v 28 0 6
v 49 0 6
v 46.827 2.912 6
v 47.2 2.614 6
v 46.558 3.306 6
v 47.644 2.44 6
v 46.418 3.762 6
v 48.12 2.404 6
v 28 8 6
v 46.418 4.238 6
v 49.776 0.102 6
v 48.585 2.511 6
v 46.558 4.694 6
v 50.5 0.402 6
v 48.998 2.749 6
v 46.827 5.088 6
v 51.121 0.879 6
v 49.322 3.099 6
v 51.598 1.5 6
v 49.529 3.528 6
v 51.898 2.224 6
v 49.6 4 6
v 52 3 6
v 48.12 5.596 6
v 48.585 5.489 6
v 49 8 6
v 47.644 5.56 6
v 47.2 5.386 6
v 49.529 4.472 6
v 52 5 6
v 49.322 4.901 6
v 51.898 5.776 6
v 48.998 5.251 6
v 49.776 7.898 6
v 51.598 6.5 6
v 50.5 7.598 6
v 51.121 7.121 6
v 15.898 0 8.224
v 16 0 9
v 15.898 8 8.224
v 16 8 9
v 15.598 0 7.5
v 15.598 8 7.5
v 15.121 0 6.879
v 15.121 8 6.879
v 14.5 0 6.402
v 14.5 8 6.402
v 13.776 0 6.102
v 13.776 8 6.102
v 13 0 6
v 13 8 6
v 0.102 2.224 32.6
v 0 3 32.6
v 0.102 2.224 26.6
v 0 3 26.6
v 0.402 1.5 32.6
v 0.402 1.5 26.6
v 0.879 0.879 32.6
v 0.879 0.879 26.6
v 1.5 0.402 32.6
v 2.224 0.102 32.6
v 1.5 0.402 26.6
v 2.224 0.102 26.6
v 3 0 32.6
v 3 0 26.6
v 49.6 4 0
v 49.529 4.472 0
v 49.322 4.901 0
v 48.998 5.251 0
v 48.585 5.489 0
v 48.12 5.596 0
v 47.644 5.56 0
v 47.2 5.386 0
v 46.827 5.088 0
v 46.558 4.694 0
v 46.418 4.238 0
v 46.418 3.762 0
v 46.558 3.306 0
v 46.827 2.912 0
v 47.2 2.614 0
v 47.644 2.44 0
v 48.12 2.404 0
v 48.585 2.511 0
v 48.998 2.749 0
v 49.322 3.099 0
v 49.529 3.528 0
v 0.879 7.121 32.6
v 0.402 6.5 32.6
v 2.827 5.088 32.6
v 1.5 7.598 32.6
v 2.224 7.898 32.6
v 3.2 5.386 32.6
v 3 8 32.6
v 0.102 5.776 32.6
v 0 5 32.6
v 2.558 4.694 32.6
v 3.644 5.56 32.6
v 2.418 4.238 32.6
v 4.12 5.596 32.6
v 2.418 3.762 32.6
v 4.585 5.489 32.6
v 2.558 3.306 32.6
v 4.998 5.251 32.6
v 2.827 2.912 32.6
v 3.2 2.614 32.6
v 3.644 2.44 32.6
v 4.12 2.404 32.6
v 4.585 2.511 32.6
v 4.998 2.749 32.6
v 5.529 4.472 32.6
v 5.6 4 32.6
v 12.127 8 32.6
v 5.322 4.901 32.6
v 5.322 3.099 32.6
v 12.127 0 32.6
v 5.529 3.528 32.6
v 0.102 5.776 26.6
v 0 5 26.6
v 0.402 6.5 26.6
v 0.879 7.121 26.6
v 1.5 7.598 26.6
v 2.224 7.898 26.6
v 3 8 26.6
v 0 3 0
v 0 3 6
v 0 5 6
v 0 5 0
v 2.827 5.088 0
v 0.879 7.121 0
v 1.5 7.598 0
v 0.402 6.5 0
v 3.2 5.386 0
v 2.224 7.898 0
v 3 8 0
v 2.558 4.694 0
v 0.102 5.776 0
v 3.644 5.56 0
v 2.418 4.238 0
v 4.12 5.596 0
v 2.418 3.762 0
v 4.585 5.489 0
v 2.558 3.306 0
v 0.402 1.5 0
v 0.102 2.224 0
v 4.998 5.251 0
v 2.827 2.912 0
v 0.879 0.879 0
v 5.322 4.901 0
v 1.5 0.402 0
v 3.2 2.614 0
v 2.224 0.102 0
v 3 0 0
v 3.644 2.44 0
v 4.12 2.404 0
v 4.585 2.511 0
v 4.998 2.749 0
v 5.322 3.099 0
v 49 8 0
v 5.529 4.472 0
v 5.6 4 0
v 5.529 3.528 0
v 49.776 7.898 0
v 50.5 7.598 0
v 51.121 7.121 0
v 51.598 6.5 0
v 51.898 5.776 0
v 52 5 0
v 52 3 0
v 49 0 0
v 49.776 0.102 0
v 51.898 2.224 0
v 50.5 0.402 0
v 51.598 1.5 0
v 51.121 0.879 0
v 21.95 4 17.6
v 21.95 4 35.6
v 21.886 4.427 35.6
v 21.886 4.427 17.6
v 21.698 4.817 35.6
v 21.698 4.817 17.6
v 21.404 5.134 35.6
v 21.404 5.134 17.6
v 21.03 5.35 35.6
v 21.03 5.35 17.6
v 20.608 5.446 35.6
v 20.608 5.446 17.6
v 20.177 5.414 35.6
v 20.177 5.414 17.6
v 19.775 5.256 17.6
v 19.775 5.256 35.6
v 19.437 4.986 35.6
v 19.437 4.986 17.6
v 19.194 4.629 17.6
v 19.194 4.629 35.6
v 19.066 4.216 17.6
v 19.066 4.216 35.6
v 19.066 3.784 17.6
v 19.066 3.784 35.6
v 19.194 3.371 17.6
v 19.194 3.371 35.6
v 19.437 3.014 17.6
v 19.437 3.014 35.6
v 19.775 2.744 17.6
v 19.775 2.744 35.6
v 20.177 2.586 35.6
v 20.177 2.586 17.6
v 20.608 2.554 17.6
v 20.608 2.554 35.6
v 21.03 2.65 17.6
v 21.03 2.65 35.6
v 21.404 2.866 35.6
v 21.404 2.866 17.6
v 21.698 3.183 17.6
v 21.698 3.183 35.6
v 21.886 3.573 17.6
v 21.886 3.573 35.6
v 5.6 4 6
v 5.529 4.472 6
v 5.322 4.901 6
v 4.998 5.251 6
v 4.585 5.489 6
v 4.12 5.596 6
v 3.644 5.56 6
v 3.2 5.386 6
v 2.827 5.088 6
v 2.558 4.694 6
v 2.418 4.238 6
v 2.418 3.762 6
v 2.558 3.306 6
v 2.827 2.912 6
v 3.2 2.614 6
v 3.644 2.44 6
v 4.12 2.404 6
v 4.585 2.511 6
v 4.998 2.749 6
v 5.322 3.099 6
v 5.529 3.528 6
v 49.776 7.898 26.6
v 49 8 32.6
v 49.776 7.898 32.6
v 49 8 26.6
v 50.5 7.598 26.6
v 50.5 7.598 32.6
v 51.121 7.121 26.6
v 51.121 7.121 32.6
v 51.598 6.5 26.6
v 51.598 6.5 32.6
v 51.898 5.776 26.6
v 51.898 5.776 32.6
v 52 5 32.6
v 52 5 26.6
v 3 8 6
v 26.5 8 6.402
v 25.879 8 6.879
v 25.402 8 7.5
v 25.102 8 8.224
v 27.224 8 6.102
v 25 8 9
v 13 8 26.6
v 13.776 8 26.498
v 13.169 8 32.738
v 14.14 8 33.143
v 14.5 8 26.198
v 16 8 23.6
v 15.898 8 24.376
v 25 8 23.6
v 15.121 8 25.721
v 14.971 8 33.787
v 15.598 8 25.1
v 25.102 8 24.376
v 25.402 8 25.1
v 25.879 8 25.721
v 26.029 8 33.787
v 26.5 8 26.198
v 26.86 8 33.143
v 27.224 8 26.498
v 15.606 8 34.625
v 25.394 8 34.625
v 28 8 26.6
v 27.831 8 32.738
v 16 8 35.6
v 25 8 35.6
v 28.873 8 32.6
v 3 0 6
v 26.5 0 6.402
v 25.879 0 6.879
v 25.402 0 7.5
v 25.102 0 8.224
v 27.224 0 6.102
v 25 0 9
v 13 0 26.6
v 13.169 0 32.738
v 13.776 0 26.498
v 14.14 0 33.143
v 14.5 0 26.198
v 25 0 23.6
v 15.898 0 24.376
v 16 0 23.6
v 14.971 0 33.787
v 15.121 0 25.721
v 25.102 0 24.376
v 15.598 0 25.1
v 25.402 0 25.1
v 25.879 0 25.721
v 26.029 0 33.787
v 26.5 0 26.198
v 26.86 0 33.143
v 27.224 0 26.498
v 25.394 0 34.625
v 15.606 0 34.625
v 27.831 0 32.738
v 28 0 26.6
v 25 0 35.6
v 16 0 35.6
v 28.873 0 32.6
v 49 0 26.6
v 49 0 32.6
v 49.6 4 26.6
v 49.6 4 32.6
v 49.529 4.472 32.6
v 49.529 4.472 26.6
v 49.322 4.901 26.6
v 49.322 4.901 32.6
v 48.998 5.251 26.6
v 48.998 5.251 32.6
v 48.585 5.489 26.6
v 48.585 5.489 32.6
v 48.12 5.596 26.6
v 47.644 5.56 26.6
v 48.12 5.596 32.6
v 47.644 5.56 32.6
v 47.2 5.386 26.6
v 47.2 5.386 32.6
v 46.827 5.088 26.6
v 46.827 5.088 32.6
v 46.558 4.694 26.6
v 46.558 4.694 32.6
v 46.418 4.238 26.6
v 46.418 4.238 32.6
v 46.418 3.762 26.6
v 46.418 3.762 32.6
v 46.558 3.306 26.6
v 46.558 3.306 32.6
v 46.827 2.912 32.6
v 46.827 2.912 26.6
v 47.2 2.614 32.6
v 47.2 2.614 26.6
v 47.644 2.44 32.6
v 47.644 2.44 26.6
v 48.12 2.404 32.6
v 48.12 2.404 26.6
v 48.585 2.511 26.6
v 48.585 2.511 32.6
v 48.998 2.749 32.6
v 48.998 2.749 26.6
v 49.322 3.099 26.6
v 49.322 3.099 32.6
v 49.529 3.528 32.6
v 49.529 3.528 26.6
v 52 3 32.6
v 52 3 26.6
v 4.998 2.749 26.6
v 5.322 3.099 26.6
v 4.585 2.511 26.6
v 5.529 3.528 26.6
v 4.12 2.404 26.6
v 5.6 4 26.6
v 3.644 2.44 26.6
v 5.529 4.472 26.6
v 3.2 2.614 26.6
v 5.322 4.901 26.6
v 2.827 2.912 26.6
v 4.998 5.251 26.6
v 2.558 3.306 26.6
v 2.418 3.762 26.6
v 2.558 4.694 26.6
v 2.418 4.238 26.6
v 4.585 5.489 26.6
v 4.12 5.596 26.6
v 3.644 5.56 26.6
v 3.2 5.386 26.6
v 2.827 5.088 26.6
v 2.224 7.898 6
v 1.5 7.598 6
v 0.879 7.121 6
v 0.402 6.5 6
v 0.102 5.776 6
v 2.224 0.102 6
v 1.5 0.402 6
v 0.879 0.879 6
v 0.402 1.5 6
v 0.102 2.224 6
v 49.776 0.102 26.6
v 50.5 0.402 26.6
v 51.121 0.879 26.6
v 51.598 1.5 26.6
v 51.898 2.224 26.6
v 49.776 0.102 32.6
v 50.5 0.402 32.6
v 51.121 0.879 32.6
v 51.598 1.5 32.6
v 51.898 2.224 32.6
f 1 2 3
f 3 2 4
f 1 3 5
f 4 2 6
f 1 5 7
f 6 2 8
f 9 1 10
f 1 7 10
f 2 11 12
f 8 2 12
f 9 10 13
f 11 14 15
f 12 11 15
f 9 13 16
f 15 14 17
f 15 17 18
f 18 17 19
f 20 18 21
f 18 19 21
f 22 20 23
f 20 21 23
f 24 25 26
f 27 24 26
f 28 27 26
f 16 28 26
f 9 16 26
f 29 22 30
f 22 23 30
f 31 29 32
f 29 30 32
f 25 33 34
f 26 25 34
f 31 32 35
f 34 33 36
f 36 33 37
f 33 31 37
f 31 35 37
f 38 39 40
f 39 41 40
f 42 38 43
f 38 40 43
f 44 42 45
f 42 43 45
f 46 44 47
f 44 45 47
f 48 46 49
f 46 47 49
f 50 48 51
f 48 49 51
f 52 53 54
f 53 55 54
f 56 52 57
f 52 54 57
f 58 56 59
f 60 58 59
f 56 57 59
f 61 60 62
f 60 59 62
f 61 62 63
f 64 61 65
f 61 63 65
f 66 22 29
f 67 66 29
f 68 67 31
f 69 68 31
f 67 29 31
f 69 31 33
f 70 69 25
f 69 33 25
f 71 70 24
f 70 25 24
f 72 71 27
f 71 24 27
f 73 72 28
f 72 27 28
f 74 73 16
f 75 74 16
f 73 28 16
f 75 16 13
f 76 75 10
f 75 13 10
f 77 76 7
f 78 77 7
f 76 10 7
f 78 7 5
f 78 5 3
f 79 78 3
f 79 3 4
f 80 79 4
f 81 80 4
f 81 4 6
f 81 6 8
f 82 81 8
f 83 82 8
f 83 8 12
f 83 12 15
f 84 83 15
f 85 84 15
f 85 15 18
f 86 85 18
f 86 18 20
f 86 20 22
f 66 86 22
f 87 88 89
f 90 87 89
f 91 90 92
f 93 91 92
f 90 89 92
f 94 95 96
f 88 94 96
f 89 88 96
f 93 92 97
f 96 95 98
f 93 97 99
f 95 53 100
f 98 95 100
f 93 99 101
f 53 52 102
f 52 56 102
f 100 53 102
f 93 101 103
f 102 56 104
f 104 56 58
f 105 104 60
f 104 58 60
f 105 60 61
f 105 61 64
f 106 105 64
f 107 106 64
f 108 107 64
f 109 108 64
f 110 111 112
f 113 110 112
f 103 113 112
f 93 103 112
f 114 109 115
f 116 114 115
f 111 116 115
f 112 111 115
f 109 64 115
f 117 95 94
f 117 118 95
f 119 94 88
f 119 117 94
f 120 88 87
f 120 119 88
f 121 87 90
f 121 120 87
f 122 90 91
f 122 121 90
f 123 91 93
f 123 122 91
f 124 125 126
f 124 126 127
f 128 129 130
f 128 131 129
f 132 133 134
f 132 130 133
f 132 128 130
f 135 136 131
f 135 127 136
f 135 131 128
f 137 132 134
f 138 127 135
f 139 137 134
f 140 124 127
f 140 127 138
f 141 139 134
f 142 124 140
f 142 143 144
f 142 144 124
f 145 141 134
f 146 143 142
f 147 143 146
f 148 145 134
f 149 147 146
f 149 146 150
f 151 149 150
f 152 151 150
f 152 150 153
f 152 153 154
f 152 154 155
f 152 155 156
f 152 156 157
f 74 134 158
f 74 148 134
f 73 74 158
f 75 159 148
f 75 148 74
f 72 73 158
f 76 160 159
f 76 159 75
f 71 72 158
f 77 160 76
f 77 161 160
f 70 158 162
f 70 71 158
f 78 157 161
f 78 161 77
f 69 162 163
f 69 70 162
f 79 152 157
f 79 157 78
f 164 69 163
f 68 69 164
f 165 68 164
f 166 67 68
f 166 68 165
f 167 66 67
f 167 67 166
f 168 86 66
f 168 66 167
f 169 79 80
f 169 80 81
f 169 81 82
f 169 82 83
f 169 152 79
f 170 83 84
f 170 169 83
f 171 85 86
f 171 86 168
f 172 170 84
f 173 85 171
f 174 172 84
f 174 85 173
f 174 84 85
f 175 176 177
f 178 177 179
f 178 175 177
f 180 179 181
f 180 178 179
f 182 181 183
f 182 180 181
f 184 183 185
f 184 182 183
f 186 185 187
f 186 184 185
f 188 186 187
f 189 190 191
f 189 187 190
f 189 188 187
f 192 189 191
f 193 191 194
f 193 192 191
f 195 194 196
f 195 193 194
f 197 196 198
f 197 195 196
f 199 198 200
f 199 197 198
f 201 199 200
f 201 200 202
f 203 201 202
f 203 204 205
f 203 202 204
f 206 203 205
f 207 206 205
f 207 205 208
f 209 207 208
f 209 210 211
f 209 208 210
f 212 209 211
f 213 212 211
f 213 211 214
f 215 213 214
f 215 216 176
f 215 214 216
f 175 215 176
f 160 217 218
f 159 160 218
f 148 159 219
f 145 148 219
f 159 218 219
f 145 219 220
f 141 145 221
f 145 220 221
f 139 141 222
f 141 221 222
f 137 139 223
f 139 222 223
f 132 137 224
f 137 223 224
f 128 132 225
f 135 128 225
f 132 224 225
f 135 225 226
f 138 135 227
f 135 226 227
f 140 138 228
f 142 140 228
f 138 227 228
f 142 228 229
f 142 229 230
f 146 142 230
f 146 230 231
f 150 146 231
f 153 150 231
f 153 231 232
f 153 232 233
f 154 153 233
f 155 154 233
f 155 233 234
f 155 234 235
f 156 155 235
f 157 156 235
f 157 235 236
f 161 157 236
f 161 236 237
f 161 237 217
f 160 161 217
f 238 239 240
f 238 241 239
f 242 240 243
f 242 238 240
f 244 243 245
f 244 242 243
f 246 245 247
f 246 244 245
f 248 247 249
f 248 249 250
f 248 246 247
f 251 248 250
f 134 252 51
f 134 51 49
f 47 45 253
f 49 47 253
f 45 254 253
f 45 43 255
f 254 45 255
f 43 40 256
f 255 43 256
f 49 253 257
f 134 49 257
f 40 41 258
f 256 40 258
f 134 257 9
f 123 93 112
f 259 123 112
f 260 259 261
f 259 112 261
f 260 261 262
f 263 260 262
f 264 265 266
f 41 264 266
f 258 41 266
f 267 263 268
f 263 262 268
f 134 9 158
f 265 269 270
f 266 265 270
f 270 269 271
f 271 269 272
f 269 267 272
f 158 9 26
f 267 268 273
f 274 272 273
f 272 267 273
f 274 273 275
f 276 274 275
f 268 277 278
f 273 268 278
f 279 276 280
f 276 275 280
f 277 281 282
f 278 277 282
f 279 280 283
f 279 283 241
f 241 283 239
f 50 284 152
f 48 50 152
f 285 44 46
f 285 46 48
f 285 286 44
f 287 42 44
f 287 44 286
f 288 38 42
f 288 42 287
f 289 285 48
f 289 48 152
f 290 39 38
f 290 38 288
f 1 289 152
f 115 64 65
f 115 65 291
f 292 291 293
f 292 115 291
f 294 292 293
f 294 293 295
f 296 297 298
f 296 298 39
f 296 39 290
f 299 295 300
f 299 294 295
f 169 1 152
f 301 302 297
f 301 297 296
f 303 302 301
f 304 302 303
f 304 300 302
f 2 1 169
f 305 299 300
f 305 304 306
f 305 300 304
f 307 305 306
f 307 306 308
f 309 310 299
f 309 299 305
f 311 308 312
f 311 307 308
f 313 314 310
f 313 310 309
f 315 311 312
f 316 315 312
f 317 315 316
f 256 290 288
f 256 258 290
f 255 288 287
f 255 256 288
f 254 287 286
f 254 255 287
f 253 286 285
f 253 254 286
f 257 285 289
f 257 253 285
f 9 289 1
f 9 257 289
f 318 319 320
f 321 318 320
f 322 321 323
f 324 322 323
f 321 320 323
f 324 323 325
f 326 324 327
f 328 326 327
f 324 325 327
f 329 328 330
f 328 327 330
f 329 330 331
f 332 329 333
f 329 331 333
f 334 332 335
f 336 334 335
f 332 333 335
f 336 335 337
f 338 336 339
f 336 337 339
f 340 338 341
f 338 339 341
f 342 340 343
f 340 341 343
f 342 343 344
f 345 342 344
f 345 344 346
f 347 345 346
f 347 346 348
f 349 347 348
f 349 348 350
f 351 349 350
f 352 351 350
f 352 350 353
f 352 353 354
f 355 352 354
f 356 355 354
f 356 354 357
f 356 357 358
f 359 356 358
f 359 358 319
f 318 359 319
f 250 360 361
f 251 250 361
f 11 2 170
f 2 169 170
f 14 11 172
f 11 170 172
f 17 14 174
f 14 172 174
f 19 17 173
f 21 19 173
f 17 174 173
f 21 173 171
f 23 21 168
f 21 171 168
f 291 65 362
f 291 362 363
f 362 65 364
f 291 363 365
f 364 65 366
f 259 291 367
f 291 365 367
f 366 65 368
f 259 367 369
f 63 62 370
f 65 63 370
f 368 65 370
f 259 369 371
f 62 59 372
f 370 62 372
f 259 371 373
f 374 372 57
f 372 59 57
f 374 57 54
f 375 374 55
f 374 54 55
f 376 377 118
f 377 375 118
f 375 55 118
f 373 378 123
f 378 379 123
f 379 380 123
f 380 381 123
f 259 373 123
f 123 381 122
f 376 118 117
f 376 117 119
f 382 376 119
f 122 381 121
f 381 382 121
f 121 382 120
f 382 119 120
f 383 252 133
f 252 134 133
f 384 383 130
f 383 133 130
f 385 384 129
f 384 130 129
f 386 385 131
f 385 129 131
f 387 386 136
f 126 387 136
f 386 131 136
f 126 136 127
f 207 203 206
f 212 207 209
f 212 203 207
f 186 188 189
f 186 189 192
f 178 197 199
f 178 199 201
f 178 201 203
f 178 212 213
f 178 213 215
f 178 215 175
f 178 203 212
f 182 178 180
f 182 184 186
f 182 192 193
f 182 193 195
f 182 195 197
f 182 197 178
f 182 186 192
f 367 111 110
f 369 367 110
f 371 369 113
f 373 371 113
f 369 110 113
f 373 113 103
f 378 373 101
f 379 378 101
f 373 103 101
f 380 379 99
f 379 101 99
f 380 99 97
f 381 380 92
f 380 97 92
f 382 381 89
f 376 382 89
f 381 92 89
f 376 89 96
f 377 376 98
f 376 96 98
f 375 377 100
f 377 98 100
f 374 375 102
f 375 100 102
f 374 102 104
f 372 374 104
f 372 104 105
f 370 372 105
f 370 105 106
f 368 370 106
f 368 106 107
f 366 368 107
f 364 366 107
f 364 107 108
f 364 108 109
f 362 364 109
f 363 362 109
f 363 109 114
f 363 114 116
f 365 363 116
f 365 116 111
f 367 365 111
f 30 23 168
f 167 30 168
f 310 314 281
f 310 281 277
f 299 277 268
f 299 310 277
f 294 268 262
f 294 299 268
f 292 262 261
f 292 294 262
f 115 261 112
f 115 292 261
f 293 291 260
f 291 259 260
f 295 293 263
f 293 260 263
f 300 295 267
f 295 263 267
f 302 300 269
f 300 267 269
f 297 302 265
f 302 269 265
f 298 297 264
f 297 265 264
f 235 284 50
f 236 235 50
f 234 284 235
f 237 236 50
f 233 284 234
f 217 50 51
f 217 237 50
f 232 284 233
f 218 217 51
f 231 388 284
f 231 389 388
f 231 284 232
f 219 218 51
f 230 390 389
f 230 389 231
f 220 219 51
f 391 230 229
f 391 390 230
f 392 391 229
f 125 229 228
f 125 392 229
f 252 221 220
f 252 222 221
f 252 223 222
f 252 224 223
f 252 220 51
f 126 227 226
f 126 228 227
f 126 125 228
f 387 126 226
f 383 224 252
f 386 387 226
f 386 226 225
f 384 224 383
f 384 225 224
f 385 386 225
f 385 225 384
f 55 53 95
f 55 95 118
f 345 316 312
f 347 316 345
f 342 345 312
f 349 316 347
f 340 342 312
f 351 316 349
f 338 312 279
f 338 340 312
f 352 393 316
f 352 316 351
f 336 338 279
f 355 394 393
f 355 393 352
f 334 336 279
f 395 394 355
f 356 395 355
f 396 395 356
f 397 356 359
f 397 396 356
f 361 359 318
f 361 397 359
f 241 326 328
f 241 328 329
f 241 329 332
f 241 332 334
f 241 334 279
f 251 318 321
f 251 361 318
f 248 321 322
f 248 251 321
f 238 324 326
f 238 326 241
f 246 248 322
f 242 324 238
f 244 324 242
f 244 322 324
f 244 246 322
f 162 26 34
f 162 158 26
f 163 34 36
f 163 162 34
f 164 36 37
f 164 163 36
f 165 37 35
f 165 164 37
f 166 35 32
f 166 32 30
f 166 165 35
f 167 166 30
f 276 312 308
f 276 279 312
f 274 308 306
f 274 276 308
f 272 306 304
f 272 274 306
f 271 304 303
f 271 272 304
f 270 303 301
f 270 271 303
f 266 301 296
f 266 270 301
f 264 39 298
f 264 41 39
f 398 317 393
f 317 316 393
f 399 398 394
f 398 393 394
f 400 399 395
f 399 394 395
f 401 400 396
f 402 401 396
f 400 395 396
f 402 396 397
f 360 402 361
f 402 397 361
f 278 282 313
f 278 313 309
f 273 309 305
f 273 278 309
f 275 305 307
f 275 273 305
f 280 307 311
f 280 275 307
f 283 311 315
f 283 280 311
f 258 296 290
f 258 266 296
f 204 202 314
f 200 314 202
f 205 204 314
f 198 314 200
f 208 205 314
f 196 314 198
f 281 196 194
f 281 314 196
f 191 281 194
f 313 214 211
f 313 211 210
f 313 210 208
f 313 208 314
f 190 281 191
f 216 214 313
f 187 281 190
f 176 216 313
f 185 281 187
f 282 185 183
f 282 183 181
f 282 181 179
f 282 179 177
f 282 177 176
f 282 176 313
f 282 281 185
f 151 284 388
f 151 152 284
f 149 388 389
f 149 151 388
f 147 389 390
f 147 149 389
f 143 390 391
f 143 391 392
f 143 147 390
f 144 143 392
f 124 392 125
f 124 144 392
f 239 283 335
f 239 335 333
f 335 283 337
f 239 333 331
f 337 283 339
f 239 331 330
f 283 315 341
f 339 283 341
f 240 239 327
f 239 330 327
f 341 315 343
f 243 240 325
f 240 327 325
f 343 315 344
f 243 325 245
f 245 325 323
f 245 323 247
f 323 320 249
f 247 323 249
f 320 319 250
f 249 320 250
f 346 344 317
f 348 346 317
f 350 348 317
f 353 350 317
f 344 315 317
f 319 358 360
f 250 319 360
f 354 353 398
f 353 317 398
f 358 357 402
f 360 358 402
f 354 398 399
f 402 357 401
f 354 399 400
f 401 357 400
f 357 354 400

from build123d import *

# Parameters (mm, degrees)
SKETCH1_W               = 52
SKETCH1_H               = 32.6
BOSS_EXTRUDE1_DEPTH     = 8
SKETCH2_W               = 20.6
SKETCH2_H               = 8
CUT_EXTRUDE1_DEPTH      = 27
SKETCH3_W               = 20.6
SKETCH3_H               = 8
CUT_EXTRUDE2_DEPTH      = 16
SKETCH5_R               = 1.6
CUT_EXTRUDE4_DEPTH      = 62.893133706
FILLET1_R               = 3
FILLET2_R               = 3
SKETCH8_W               = 9
SKETCH8_H               = 8
BOSS_EXTRUDE2_DEPTH     = 3
CUT_EXTRUDE5_DEPTH      = 4
CUT_EXTRUDE5_DEPTH_BACK = 15
SKETCH6_R               = 1.45
FILLET3_R               = 4


with BuildPart() as part:
    # Sketch1 → Boss-Extrude1 (new body)
    with BuildSketch(Plane(origin=(0, 0, 0), x_dir=(1, 0, 0), z_dir=(0, 1, 0))):
        with Locations((26, -16.3)):
            Rectangle(SKETCH1_W, SKETCH1_H)
    extrude(amount=BOSS_EXTRUDE1_DEPTH)

    # Sketch2 → Cut-Extrude1 (cut)
    with BuildSketch(Plane(origin=(52, 0, 0), x_dir=(0, 0, -1), z_dir=(1, 0, 0))):
        with Locations((-16.3, 4)):
            Rectangle(SKETCH2_W, SKETCH2_H)
    extrude(amount=-CUT_EXTRUDE1_DEPTH, mode=Mode.SUBTRACT)

    # Sketch3 → Cut-Extrude2 (cut)
    with BuildSketch(Plane.ZY):
        with Locations((16.3, 4)):
            Rectangle(SKETCH3_W, SKETCH3_H)
    extrude(amount=-CUT_EXTRUDE2_DEPTH, mode=Mode.SUBTRACT)

    # Sketch5 → Cut-Extrude4 (cut, through all)
    with BuildSketch(Plane.XY.offset(32.6)):
        with Locations((4, 4)):
            Circle(SKETCH5_R)
        with Locations((48, 4)):
            Circle(SKETCH5_R)
    extrude(amount=-CUT_EXTRUDE4_DEPTH, mode=Mode.SUBTRACT)

    # Fillet1
    fillet1_edges = [part.edges().sort_by_distance(p)[0] for p in [
        (52, 8, 29.6),
        (52, 0, 3),
        (52, 8, 3),
        (0, 0, 29.6),
        (0, 8, 29.6),
        (0, 8, 3),
        (52, 0, 29.6),
        (0, 0, 3),
    ]]
    fillet(fillet1_edges, radius=FILLET1_R)

    # Fillet2
    fillet2_edges = [part.edges().sort_by_distance(p)[0] for p in [
        (25, 4, 26.6),
        (25, 4, 6),
        (16, 4, 6),
        (16, 4, 26.6),
    ]]
    fillet(fillet2_edges, radius=FILLET2_R)

    # Sketch8 → Boss-Extrude2 (add)
    with BuildSketch(Plane.XY.offset(32.6)):
        with Locations((20.5, 4)):
            Rectangle(SKETCH8_W, SKETCH8_H)
    extrude(amount=BOSS_EXTRUDE2_DEPTH)

    # Sketch6 → Cut-Extrude5 (cut, two sides: drawn at the far end of the back side and taken through both)
    with BuildSketch(Plane.XY.offset(32.6).offset(-CUT_EXTRUDE5_DEPTH_BACK)):
        with Locations((20.5, 4)):
            Circle(SKETCH6_R)
    extrude(amount=CUT_EXTRUDE5_DEPTH + CUT_EXTRUDE5_DEPTH_BACK, mode=Mode.SUBTRACT)

    # Fillet3
    # the kernel refuses this fillet: 4 mm, written as the material it adds along each edge
    with BuildSketch(Plane(origin=(25, 8, 32.6), x_dir=(0, 0, 1), z_dir=(0, -1, 0))) as fillet3_piece_1:
        with BuildLine():
            CenterArc((4, -3.872983346), FILLET3_R, 104.477512186, 75.522487814)
            Line((0, -3.872983346), (-0.08, -3.872983346))
            Line((-0.08, -3.872983346), (-0.08, 0))
            Line((-0.08, 0), (0, 0.08))
            ThreePointArc((0, 0.08), (1.5, 0.08), (2.98, 0.077459667))
            Line((2.98, 0.077459667), (3, 0))
        make_face()
    extrude(amount=8)
    with BuildSketch(Plane(origin=(16, 0, 32.6), x_dir=(-1, 0, 0), z_dir=(0, 1, 0))) as fillet3_piece_2:
        with BuildLine():
            CenterArc((3.872983346, 4), FILLET3_R, 194.477512186, 75.522487814)
            Line((0, 3), (-0.077459667, 2.98))
            ThreePointArc((-0.077459667, 2.98), (-0.08, 1.5), (-0.08, 0))
            Line((-0.08, 0), (0, -0.08))
            Line((0, -0.08), (3.872983346, -0.08))
            Line((3.872983346, -0.08), (3.872983346, 0))
        make_face()
    extrude(amount=8)


solid = part.part
